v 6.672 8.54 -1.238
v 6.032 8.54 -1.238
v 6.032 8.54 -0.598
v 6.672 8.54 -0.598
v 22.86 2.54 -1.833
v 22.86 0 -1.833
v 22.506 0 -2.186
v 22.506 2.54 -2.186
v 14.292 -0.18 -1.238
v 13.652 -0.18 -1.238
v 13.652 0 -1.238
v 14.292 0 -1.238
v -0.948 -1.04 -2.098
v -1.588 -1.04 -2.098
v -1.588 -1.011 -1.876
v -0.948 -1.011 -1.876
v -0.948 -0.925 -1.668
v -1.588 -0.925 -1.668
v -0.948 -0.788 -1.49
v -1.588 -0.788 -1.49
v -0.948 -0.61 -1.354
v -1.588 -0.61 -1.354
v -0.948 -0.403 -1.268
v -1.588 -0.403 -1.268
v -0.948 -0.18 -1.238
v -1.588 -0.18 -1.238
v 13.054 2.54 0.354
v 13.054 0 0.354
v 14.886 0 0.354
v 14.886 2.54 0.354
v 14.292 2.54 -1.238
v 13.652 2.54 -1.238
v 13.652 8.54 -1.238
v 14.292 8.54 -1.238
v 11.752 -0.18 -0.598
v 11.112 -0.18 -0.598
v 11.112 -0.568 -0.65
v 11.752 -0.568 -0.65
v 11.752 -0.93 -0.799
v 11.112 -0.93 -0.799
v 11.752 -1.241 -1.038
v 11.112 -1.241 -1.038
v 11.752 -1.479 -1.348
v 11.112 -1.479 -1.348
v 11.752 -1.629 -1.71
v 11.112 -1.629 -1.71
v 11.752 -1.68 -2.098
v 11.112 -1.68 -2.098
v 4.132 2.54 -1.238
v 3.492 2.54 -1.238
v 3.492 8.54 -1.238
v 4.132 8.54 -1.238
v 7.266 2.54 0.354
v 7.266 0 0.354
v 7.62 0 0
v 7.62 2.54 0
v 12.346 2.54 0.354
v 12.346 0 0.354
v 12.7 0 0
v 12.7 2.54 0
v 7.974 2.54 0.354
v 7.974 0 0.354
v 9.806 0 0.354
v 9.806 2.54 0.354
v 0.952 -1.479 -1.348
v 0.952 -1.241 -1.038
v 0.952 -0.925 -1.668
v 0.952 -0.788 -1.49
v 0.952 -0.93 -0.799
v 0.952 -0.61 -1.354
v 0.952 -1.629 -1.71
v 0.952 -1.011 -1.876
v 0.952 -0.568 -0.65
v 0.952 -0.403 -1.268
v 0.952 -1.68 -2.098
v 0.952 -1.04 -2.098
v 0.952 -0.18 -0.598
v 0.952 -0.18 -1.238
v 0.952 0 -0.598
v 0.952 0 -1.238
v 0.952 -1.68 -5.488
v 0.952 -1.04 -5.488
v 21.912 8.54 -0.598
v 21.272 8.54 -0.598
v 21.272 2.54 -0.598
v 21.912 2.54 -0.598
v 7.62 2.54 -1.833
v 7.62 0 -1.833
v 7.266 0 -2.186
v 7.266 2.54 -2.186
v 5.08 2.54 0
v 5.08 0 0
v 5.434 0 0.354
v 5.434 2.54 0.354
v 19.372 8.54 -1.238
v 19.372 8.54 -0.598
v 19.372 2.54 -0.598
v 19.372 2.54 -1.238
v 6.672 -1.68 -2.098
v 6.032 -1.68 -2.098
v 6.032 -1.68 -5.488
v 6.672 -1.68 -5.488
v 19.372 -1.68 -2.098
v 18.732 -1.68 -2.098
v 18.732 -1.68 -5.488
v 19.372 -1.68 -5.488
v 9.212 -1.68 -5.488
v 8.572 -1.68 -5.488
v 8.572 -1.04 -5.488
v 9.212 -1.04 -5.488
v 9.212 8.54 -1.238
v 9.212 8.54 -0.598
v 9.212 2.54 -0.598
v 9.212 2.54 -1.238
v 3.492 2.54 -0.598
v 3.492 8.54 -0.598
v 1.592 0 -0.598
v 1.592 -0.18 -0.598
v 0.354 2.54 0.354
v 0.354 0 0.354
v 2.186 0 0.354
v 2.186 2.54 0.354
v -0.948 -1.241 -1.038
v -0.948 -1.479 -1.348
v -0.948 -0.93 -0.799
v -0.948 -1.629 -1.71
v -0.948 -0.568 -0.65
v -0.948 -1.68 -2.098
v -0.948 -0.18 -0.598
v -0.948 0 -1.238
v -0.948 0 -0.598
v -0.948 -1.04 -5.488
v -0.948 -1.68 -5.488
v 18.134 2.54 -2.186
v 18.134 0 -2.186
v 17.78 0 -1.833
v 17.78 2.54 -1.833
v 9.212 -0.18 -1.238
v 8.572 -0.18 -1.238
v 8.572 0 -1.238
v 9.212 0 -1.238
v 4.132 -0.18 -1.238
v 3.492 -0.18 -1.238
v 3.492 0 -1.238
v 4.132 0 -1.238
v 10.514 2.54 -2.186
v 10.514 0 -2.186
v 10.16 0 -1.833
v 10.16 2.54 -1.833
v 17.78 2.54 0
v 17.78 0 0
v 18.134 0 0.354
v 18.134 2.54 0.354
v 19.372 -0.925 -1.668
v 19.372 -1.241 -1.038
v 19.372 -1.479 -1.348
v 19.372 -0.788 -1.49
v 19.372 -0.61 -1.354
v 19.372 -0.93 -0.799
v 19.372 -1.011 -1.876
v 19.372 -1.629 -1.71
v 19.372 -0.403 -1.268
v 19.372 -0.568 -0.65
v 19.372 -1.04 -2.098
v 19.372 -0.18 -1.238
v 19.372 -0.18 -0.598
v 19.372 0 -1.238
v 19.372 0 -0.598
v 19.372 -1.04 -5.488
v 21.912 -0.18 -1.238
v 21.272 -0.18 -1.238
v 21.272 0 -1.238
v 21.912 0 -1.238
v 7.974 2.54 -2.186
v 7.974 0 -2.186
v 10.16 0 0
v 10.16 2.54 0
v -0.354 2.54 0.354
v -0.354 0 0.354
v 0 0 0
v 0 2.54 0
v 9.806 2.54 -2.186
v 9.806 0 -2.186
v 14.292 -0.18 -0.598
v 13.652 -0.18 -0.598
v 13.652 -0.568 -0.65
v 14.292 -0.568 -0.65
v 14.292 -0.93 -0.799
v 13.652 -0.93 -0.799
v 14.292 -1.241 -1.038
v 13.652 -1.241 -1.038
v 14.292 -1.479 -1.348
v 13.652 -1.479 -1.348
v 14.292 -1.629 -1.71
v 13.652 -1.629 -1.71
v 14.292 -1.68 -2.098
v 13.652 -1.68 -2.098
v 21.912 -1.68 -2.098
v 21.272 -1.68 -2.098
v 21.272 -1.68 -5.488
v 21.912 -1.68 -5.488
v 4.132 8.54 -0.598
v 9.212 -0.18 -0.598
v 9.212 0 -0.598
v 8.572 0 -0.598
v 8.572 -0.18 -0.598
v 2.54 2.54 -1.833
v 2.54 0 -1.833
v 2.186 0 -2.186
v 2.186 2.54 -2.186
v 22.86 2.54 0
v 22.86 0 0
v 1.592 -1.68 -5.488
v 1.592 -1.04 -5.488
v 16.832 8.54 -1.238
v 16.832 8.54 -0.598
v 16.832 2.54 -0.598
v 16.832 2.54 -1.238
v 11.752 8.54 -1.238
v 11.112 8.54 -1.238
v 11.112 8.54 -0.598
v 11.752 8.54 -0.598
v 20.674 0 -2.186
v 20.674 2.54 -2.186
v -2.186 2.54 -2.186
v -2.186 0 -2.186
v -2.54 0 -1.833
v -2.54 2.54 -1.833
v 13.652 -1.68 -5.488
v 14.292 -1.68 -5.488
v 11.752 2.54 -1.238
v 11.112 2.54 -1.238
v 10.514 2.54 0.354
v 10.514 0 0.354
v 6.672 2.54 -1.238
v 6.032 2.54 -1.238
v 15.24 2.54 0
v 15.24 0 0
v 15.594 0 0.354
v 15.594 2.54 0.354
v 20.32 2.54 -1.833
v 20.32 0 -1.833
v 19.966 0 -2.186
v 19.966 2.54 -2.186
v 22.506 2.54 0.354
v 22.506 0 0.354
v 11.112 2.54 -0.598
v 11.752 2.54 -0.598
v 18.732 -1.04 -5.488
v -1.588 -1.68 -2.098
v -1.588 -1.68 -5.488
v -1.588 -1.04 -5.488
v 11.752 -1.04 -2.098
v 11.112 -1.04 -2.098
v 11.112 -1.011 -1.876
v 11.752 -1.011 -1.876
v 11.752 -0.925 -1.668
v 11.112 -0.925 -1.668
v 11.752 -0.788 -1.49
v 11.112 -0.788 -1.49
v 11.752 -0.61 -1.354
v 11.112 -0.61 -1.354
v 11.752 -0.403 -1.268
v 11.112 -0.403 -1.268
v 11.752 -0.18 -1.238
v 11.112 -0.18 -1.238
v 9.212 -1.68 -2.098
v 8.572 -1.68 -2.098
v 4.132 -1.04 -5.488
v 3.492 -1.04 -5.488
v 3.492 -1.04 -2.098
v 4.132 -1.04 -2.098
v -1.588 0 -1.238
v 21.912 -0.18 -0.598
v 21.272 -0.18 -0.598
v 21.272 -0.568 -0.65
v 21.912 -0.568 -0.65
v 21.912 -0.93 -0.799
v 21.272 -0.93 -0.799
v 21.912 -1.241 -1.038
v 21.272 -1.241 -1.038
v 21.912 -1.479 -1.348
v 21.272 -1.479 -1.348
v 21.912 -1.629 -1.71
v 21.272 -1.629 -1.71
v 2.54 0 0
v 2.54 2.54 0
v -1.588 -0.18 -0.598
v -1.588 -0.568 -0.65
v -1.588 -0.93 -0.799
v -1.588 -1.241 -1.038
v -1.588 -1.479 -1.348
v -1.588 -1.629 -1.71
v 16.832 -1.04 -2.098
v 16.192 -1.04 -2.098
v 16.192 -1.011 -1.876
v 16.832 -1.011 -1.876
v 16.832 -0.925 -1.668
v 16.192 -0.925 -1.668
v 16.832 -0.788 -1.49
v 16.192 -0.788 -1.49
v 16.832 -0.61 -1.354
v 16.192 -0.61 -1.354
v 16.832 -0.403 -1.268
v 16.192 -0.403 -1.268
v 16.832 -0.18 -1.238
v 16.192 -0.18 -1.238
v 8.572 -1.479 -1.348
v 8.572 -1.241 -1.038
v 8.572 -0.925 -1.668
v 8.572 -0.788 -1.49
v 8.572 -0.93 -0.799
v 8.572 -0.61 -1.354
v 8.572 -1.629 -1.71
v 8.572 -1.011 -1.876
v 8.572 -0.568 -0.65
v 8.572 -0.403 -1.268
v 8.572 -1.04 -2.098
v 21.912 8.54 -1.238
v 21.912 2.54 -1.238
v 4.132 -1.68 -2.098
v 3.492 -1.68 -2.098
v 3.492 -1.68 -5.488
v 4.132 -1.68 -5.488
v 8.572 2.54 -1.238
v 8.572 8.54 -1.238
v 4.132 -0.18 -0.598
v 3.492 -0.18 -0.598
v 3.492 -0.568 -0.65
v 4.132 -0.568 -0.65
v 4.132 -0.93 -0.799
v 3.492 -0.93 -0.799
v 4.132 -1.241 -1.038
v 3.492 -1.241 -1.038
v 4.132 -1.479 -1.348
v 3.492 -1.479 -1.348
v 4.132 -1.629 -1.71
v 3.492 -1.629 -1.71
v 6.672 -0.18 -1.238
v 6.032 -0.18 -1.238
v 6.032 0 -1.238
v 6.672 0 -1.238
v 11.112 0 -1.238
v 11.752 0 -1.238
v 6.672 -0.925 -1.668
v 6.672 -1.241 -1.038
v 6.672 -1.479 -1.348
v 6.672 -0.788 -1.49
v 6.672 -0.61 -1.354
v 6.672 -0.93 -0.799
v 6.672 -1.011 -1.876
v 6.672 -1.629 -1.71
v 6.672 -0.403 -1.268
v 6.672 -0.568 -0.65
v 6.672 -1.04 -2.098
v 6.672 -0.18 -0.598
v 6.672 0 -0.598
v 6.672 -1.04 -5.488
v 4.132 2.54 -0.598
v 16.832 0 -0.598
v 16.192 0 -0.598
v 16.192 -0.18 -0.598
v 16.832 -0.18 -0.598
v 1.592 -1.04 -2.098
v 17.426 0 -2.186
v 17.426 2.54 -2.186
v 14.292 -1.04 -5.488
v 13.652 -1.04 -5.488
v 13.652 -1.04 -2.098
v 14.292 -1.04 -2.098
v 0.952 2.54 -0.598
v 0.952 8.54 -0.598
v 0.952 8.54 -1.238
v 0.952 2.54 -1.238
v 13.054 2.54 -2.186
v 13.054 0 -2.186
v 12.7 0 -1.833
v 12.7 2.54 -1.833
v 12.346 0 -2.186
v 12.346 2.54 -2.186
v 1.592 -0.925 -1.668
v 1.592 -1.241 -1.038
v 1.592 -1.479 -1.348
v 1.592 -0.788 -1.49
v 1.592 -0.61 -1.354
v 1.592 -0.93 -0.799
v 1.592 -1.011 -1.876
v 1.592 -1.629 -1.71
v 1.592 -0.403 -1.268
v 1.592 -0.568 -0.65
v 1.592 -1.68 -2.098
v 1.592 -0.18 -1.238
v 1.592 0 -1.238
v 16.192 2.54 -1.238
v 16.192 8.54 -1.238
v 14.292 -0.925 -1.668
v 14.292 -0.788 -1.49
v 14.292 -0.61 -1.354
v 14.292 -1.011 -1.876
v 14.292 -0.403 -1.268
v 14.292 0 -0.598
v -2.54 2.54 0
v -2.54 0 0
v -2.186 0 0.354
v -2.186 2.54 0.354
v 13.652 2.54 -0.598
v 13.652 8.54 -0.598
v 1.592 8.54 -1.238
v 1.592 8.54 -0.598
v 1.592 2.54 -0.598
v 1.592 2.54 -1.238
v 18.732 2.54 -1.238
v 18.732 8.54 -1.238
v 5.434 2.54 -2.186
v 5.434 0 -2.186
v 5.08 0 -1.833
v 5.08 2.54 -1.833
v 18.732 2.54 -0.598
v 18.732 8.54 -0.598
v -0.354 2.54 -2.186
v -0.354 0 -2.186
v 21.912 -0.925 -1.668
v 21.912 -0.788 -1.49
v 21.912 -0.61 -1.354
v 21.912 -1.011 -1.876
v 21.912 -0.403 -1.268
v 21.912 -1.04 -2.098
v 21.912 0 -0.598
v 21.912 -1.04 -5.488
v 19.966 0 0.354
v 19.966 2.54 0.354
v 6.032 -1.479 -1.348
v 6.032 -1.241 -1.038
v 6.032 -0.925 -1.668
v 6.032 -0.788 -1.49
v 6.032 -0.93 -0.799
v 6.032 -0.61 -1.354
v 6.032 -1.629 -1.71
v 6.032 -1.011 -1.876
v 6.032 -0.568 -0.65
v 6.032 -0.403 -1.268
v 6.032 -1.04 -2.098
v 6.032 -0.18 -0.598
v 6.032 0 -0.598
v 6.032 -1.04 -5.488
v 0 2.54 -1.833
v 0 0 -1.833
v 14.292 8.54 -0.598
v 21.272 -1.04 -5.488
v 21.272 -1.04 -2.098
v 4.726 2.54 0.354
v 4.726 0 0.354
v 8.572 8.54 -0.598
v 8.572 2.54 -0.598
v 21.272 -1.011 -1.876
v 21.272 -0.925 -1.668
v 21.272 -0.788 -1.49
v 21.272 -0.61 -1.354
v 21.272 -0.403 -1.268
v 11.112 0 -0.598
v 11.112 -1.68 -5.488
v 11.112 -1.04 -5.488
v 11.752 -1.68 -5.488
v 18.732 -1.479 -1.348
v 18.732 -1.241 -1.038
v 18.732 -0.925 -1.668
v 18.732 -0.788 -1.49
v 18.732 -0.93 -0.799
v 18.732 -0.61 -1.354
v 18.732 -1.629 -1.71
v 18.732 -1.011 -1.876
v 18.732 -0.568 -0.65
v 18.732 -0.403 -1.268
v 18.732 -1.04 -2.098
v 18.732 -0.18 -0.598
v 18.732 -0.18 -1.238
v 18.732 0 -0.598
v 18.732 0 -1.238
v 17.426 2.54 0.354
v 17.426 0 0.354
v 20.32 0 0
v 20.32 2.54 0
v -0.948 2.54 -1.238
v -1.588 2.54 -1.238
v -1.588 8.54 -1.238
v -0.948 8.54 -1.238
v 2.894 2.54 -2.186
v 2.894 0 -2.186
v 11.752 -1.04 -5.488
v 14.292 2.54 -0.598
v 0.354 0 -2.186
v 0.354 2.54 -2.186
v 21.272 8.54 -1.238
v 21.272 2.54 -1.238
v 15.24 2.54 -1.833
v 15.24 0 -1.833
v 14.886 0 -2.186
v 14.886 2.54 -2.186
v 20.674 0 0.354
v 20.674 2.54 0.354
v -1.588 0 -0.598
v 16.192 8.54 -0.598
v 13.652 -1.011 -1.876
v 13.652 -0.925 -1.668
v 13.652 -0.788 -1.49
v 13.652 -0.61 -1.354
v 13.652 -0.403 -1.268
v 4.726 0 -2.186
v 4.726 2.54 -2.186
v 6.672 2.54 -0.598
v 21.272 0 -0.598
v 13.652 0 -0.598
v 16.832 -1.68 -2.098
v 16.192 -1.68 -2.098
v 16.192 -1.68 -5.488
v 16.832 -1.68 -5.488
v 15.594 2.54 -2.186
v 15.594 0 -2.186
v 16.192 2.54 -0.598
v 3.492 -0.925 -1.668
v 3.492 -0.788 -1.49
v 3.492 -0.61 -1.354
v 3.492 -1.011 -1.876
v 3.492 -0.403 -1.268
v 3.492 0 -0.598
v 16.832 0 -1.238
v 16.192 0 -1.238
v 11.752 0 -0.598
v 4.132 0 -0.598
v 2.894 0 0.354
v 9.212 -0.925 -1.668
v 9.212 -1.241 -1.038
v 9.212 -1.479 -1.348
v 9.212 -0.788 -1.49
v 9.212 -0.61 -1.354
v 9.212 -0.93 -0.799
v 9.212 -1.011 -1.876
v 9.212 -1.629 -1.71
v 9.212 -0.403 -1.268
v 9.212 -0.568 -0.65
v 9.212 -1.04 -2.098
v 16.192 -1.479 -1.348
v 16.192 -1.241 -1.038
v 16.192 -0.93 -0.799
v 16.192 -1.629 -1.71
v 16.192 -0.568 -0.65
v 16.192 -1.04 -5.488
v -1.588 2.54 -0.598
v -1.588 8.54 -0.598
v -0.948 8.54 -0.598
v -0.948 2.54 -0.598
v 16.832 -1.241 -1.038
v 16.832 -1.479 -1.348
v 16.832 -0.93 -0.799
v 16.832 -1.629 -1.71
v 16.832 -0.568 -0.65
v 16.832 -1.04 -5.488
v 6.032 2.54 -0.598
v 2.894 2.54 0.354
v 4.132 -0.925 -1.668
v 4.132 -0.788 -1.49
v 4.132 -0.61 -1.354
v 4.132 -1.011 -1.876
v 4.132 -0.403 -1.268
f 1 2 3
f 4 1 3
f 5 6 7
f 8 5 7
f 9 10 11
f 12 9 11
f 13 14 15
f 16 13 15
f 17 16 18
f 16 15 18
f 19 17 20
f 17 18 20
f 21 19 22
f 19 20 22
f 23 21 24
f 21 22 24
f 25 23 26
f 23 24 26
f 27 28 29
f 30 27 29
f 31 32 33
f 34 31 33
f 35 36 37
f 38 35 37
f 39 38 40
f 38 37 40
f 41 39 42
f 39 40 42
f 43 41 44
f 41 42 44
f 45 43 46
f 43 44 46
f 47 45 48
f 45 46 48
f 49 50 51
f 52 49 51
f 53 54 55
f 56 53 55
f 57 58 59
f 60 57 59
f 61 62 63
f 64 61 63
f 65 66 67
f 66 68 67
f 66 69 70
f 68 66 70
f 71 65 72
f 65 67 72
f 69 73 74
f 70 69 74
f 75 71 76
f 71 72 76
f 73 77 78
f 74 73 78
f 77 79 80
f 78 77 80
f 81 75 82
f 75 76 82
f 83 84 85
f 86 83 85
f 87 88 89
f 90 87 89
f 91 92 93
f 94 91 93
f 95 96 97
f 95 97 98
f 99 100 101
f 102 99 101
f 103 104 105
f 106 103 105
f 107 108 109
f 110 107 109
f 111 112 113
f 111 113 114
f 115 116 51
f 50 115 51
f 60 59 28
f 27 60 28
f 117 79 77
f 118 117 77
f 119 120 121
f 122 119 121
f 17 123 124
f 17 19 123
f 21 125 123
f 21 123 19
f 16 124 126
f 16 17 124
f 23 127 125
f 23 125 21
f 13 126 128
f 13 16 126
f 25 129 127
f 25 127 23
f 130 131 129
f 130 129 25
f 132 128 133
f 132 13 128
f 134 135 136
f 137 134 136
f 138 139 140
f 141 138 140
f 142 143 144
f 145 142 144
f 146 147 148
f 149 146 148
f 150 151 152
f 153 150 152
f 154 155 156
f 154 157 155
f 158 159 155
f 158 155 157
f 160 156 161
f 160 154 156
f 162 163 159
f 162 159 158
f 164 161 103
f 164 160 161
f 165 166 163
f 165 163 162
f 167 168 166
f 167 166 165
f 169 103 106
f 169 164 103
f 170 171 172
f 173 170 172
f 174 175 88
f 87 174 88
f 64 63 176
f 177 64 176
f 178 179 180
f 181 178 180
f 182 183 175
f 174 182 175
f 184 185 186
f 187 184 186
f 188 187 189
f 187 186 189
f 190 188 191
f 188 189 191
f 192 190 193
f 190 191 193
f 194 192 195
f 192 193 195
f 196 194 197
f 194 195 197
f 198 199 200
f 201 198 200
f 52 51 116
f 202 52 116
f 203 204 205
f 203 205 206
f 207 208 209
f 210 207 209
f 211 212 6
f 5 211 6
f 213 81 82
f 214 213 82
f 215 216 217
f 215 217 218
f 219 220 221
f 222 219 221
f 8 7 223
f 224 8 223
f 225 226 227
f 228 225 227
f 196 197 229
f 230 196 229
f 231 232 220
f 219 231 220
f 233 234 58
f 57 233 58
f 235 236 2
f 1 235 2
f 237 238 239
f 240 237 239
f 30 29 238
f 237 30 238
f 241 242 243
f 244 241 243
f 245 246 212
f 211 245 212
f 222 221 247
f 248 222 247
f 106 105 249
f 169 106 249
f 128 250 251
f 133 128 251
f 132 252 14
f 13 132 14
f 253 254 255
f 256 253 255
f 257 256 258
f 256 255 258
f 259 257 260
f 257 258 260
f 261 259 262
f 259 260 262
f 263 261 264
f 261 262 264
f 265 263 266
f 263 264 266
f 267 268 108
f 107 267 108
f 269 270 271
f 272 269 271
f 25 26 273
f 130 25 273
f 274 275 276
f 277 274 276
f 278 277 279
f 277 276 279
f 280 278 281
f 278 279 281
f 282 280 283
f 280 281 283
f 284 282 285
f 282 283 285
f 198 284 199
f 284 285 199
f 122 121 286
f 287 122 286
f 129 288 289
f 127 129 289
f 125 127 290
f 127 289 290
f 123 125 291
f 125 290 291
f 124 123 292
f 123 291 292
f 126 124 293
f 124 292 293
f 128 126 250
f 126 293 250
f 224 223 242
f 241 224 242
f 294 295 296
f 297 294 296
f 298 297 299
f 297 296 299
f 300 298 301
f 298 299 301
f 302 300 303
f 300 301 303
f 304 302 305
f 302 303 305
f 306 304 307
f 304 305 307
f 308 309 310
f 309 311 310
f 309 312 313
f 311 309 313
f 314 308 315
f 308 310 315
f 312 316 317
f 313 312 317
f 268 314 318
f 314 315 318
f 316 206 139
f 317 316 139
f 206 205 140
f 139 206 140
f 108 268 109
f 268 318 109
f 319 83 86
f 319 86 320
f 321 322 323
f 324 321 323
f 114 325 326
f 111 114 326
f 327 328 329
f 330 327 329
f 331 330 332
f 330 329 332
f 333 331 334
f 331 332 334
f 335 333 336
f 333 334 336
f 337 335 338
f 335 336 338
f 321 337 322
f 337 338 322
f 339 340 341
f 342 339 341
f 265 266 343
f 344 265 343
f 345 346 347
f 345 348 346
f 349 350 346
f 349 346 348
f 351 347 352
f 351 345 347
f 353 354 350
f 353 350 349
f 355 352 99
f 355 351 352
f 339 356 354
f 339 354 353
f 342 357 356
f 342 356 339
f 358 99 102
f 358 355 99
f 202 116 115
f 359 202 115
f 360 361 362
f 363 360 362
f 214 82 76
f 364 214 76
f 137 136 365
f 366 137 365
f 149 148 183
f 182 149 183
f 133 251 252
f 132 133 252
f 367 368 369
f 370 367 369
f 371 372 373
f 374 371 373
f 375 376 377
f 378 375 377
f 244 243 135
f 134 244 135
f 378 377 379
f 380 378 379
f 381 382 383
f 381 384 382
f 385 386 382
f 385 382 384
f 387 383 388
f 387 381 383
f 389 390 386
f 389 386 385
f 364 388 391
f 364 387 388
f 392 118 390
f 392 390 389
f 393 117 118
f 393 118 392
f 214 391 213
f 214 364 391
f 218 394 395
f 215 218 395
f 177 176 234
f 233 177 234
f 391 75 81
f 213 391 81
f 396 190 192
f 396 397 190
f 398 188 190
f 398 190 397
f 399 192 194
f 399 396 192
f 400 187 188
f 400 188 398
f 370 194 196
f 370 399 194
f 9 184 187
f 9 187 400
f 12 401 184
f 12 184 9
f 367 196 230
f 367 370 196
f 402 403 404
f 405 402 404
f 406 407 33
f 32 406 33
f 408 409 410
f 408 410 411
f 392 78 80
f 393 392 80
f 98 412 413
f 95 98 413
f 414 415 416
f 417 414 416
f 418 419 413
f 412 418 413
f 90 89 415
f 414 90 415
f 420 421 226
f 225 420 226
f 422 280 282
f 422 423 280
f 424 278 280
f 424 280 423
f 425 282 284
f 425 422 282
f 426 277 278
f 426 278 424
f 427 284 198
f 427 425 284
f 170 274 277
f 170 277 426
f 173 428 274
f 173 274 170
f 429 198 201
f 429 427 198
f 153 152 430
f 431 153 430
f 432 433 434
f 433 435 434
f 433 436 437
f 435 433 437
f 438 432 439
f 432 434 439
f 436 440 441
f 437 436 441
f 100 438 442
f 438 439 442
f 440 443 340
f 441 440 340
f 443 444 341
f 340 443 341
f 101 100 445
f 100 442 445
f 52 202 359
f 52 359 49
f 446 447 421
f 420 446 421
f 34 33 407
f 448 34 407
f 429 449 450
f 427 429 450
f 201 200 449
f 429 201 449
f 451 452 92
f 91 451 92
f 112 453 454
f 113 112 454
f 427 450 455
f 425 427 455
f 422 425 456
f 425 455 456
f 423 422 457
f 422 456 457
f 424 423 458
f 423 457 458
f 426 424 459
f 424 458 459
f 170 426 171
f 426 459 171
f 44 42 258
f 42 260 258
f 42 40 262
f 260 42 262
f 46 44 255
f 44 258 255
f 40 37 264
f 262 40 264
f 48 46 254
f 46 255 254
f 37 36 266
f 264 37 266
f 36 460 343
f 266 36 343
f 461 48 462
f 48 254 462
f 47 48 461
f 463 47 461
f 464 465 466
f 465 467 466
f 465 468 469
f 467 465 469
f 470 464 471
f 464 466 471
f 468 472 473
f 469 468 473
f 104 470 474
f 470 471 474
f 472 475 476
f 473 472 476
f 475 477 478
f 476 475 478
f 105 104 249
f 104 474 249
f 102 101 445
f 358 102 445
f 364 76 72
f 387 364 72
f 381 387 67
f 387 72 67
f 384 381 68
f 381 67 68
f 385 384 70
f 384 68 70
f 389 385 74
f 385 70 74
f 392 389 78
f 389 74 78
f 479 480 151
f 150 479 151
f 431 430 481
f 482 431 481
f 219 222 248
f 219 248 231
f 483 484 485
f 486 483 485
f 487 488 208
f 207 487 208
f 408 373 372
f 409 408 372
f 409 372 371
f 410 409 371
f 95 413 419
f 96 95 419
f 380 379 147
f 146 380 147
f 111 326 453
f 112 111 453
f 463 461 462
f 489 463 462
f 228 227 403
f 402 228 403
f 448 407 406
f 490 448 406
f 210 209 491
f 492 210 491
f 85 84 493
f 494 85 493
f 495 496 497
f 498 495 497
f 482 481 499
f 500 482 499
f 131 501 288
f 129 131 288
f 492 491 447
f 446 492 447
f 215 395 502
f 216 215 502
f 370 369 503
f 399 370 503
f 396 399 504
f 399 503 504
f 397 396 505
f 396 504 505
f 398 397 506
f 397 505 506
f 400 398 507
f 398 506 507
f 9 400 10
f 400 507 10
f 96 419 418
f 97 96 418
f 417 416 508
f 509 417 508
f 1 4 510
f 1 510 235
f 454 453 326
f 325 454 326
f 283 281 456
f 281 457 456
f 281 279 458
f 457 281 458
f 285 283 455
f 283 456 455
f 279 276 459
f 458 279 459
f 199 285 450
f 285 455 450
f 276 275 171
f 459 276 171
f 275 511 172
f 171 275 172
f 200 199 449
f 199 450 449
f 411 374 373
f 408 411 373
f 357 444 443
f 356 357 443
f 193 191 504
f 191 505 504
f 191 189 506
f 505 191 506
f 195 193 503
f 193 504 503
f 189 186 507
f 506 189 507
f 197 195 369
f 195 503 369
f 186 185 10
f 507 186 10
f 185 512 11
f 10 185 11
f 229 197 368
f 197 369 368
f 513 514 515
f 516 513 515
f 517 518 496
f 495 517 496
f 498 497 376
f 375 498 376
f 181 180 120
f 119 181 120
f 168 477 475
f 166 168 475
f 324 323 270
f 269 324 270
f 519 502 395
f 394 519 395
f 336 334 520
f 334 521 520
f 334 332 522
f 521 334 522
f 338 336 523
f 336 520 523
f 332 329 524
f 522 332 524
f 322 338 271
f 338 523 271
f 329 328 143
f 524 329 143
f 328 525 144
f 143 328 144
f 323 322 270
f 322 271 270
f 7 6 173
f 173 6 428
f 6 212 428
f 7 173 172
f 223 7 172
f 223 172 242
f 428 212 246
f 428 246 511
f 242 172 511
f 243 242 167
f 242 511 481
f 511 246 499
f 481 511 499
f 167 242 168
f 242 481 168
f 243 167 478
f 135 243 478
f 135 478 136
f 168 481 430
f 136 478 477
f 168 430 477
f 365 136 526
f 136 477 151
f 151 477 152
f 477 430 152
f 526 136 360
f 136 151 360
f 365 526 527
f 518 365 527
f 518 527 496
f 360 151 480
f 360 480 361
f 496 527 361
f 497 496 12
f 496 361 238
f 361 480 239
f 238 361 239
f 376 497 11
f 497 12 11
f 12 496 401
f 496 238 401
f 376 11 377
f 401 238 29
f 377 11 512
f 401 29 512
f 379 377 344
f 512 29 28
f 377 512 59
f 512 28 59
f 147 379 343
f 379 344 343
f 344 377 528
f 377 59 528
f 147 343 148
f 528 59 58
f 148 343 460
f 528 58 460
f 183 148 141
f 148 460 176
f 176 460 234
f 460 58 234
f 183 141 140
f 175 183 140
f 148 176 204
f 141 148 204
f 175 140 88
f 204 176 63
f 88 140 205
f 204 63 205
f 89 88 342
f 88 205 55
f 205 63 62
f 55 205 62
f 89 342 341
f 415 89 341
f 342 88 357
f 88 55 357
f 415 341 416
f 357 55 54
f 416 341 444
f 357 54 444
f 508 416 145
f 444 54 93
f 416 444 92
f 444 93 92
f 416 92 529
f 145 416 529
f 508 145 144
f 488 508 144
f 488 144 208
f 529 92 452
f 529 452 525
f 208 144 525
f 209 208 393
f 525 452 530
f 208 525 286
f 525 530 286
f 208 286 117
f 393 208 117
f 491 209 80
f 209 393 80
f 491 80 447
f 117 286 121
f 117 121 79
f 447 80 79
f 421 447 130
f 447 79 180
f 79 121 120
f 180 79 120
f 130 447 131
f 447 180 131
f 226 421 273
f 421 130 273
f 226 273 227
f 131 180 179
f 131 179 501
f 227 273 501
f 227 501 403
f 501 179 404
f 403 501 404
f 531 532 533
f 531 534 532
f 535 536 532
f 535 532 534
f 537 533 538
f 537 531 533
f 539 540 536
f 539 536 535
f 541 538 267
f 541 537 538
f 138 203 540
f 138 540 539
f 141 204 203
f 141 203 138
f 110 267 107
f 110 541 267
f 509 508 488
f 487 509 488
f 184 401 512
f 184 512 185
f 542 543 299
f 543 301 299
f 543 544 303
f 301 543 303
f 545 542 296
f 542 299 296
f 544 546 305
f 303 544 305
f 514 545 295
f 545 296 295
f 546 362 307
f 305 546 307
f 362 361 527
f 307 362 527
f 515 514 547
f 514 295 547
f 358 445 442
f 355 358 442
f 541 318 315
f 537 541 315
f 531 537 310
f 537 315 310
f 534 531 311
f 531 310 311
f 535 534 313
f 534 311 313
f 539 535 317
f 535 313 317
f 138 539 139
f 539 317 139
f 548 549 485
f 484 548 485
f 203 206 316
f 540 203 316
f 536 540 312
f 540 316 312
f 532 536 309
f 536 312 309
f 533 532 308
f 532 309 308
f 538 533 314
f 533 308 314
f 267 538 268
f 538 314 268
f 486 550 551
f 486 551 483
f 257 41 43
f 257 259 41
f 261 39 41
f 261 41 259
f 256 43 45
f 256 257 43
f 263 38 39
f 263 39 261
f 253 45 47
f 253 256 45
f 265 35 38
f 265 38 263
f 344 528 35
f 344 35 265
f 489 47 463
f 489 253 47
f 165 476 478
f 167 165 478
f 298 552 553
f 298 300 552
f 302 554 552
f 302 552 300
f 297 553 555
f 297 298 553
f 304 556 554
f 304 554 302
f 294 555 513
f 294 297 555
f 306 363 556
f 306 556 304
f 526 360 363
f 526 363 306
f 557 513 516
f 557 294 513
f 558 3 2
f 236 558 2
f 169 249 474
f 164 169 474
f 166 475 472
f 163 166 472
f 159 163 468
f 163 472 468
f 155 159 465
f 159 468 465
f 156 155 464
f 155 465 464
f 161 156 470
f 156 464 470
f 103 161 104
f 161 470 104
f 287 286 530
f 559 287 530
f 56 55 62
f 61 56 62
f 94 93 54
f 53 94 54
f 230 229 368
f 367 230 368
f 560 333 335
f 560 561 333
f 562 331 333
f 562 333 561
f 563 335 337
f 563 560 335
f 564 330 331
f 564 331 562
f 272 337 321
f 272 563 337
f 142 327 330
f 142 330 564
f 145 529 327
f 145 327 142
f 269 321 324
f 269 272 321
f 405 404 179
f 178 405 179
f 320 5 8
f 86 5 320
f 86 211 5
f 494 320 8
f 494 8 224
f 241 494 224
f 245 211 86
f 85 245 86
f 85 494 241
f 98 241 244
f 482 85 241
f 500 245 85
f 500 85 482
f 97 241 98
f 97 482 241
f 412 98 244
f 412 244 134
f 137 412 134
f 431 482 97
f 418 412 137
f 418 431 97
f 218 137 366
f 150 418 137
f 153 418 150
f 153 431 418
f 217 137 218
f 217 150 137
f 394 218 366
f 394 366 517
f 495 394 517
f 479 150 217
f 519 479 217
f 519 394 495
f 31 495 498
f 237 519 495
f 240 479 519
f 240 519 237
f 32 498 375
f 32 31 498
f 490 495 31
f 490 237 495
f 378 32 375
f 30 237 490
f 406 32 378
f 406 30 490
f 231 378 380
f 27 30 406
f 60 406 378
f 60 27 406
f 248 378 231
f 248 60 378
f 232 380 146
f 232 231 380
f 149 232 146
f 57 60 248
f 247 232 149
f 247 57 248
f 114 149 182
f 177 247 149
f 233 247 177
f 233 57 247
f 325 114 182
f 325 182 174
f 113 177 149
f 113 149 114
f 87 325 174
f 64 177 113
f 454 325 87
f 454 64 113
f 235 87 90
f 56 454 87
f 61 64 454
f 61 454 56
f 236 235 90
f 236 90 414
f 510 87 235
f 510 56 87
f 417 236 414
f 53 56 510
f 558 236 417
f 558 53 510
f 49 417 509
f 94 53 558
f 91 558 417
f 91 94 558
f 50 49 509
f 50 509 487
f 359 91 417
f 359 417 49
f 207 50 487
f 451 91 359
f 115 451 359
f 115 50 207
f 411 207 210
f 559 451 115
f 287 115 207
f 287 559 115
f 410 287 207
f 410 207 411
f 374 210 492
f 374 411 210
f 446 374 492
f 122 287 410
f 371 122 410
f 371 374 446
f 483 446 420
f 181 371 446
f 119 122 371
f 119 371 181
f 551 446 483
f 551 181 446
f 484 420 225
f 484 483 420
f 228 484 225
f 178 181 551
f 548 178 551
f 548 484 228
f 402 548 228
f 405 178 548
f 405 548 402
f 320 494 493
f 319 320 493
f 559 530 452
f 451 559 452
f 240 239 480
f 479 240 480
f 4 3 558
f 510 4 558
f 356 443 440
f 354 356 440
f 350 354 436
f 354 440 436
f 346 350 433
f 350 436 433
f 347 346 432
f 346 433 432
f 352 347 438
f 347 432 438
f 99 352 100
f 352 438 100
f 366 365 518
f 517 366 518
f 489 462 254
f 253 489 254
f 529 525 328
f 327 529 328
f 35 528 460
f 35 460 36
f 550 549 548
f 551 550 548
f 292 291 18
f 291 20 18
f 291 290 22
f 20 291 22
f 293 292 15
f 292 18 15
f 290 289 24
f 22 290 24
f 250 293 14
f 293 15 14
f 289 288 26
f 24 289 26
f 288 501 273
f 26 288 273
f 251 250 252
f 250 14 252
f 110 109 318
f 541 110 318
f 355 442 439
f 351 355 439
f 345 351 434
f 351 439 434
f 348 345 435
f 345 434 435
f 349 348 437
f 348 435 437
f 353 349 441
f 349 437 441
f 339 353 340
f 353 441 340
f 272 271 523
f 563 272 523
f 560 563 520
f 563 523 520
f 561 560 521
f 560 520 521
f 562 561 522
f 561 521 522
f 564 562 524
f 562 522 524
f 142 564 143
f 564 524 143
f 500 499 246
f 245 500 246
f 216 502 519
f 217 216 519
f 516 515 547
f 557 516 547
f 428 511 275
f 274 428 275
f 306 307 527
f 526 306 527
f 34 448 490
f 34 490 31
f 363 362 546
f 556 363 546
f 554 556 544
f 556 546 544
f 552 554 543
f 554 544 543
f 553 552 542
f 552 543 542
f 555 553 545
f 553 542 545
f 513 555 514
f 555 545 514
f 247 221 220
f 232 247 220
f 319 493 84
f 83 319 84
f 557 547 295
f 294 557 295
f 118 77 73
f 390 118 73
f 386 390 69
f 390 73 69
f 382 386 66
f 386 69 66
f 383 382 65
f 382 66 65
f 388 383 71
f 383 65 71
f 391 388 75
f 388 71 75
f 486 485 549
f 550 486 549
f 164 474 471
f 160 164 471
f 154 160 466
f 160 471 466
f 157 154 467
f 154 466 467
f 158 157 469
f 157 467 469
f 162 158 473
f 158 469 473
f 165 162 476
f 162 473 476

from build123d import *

# Parameters (mm, degrees)
SKETCH1_W                  = 0.636
SKETCH1_H                  = 0.636
BOSS_EXTRUDE1_DEPTH        = 2.54
BOSS_EXTRU_1_DEPTH         = 0.64
R_P_TITION_LIN_AIRE1_COUNT = 10
R_P_TITION_LIN_AIRE1_PITCH = 2.54


with BuildPart() as part:
    # Sketch1 → Boss-Extrude1 (new body)
    with BuildSketch(Plane.XZ):
        Polygon((-0.353553391, -2.186446609), (-2.186446609, -2.186446609), (-2.54, -1.832893219), (-2.54, 0), (-2.186446609, 0.353553391), (-0.353553391, 0.353553391), (0, 0), (0, -1.832893219), align=None)
        with Locations((-1.27, -0.916446609)):
            Rectangle(SKETCH1_W, SKETCH1_H, mode=Mode.SUBTRACT)
    boss_extrude1 = extrude(amount=-BOSS_EXTRUDE1_DEPTH)

    # Esquisse1 → Boss.-Extru.1 (add)
    with BuildSketch(Plane(origin=(-1.588, 0, 0), x_dir=(0, 0, -1), z_dir=(1, 0, 0))):
        with BuildLine():
            Line((0.598446609, 8.54), (0.598446609, -0.18))
            ThreePointArc((0.598446609, -0.18), (1.037786438, -1.240660172), (2.098446609, -1.68))
            Line((2.098446609, -1.68), (5.488446609, -1.68))
            Line((5.488446609, -1.68), (5.488446609, -1.04))
            Line((5.488446609, -1.04), (2.098446609, -1.04))
            ThreePointArc((2.098446609, -1.04), (1.490334778, -0.788111832), (1.238446609, -0.18))
            Line((1.238446609, -0.18), (1.238446609, 8.54))
            Line((1.238446609, 8.54), (0.598446609, 8.54))
        make_face()
    boss_extru_1 = extrude(amount=BOSS_EXTRU_1_DEPTH)

    # Répétition linéaire1: Boss-Extrude1, Boss.-Extru.1 ×10
    with Locations(*[(i * R_P_TITION_LIN_AIRE1_PITCH, 0, 0) for i in range(1, R_P_TITION_LIN_AIRE1_COUNT)]):
        add(boss_extrude1)
        add(boss_extru_1)


solid = part.part
